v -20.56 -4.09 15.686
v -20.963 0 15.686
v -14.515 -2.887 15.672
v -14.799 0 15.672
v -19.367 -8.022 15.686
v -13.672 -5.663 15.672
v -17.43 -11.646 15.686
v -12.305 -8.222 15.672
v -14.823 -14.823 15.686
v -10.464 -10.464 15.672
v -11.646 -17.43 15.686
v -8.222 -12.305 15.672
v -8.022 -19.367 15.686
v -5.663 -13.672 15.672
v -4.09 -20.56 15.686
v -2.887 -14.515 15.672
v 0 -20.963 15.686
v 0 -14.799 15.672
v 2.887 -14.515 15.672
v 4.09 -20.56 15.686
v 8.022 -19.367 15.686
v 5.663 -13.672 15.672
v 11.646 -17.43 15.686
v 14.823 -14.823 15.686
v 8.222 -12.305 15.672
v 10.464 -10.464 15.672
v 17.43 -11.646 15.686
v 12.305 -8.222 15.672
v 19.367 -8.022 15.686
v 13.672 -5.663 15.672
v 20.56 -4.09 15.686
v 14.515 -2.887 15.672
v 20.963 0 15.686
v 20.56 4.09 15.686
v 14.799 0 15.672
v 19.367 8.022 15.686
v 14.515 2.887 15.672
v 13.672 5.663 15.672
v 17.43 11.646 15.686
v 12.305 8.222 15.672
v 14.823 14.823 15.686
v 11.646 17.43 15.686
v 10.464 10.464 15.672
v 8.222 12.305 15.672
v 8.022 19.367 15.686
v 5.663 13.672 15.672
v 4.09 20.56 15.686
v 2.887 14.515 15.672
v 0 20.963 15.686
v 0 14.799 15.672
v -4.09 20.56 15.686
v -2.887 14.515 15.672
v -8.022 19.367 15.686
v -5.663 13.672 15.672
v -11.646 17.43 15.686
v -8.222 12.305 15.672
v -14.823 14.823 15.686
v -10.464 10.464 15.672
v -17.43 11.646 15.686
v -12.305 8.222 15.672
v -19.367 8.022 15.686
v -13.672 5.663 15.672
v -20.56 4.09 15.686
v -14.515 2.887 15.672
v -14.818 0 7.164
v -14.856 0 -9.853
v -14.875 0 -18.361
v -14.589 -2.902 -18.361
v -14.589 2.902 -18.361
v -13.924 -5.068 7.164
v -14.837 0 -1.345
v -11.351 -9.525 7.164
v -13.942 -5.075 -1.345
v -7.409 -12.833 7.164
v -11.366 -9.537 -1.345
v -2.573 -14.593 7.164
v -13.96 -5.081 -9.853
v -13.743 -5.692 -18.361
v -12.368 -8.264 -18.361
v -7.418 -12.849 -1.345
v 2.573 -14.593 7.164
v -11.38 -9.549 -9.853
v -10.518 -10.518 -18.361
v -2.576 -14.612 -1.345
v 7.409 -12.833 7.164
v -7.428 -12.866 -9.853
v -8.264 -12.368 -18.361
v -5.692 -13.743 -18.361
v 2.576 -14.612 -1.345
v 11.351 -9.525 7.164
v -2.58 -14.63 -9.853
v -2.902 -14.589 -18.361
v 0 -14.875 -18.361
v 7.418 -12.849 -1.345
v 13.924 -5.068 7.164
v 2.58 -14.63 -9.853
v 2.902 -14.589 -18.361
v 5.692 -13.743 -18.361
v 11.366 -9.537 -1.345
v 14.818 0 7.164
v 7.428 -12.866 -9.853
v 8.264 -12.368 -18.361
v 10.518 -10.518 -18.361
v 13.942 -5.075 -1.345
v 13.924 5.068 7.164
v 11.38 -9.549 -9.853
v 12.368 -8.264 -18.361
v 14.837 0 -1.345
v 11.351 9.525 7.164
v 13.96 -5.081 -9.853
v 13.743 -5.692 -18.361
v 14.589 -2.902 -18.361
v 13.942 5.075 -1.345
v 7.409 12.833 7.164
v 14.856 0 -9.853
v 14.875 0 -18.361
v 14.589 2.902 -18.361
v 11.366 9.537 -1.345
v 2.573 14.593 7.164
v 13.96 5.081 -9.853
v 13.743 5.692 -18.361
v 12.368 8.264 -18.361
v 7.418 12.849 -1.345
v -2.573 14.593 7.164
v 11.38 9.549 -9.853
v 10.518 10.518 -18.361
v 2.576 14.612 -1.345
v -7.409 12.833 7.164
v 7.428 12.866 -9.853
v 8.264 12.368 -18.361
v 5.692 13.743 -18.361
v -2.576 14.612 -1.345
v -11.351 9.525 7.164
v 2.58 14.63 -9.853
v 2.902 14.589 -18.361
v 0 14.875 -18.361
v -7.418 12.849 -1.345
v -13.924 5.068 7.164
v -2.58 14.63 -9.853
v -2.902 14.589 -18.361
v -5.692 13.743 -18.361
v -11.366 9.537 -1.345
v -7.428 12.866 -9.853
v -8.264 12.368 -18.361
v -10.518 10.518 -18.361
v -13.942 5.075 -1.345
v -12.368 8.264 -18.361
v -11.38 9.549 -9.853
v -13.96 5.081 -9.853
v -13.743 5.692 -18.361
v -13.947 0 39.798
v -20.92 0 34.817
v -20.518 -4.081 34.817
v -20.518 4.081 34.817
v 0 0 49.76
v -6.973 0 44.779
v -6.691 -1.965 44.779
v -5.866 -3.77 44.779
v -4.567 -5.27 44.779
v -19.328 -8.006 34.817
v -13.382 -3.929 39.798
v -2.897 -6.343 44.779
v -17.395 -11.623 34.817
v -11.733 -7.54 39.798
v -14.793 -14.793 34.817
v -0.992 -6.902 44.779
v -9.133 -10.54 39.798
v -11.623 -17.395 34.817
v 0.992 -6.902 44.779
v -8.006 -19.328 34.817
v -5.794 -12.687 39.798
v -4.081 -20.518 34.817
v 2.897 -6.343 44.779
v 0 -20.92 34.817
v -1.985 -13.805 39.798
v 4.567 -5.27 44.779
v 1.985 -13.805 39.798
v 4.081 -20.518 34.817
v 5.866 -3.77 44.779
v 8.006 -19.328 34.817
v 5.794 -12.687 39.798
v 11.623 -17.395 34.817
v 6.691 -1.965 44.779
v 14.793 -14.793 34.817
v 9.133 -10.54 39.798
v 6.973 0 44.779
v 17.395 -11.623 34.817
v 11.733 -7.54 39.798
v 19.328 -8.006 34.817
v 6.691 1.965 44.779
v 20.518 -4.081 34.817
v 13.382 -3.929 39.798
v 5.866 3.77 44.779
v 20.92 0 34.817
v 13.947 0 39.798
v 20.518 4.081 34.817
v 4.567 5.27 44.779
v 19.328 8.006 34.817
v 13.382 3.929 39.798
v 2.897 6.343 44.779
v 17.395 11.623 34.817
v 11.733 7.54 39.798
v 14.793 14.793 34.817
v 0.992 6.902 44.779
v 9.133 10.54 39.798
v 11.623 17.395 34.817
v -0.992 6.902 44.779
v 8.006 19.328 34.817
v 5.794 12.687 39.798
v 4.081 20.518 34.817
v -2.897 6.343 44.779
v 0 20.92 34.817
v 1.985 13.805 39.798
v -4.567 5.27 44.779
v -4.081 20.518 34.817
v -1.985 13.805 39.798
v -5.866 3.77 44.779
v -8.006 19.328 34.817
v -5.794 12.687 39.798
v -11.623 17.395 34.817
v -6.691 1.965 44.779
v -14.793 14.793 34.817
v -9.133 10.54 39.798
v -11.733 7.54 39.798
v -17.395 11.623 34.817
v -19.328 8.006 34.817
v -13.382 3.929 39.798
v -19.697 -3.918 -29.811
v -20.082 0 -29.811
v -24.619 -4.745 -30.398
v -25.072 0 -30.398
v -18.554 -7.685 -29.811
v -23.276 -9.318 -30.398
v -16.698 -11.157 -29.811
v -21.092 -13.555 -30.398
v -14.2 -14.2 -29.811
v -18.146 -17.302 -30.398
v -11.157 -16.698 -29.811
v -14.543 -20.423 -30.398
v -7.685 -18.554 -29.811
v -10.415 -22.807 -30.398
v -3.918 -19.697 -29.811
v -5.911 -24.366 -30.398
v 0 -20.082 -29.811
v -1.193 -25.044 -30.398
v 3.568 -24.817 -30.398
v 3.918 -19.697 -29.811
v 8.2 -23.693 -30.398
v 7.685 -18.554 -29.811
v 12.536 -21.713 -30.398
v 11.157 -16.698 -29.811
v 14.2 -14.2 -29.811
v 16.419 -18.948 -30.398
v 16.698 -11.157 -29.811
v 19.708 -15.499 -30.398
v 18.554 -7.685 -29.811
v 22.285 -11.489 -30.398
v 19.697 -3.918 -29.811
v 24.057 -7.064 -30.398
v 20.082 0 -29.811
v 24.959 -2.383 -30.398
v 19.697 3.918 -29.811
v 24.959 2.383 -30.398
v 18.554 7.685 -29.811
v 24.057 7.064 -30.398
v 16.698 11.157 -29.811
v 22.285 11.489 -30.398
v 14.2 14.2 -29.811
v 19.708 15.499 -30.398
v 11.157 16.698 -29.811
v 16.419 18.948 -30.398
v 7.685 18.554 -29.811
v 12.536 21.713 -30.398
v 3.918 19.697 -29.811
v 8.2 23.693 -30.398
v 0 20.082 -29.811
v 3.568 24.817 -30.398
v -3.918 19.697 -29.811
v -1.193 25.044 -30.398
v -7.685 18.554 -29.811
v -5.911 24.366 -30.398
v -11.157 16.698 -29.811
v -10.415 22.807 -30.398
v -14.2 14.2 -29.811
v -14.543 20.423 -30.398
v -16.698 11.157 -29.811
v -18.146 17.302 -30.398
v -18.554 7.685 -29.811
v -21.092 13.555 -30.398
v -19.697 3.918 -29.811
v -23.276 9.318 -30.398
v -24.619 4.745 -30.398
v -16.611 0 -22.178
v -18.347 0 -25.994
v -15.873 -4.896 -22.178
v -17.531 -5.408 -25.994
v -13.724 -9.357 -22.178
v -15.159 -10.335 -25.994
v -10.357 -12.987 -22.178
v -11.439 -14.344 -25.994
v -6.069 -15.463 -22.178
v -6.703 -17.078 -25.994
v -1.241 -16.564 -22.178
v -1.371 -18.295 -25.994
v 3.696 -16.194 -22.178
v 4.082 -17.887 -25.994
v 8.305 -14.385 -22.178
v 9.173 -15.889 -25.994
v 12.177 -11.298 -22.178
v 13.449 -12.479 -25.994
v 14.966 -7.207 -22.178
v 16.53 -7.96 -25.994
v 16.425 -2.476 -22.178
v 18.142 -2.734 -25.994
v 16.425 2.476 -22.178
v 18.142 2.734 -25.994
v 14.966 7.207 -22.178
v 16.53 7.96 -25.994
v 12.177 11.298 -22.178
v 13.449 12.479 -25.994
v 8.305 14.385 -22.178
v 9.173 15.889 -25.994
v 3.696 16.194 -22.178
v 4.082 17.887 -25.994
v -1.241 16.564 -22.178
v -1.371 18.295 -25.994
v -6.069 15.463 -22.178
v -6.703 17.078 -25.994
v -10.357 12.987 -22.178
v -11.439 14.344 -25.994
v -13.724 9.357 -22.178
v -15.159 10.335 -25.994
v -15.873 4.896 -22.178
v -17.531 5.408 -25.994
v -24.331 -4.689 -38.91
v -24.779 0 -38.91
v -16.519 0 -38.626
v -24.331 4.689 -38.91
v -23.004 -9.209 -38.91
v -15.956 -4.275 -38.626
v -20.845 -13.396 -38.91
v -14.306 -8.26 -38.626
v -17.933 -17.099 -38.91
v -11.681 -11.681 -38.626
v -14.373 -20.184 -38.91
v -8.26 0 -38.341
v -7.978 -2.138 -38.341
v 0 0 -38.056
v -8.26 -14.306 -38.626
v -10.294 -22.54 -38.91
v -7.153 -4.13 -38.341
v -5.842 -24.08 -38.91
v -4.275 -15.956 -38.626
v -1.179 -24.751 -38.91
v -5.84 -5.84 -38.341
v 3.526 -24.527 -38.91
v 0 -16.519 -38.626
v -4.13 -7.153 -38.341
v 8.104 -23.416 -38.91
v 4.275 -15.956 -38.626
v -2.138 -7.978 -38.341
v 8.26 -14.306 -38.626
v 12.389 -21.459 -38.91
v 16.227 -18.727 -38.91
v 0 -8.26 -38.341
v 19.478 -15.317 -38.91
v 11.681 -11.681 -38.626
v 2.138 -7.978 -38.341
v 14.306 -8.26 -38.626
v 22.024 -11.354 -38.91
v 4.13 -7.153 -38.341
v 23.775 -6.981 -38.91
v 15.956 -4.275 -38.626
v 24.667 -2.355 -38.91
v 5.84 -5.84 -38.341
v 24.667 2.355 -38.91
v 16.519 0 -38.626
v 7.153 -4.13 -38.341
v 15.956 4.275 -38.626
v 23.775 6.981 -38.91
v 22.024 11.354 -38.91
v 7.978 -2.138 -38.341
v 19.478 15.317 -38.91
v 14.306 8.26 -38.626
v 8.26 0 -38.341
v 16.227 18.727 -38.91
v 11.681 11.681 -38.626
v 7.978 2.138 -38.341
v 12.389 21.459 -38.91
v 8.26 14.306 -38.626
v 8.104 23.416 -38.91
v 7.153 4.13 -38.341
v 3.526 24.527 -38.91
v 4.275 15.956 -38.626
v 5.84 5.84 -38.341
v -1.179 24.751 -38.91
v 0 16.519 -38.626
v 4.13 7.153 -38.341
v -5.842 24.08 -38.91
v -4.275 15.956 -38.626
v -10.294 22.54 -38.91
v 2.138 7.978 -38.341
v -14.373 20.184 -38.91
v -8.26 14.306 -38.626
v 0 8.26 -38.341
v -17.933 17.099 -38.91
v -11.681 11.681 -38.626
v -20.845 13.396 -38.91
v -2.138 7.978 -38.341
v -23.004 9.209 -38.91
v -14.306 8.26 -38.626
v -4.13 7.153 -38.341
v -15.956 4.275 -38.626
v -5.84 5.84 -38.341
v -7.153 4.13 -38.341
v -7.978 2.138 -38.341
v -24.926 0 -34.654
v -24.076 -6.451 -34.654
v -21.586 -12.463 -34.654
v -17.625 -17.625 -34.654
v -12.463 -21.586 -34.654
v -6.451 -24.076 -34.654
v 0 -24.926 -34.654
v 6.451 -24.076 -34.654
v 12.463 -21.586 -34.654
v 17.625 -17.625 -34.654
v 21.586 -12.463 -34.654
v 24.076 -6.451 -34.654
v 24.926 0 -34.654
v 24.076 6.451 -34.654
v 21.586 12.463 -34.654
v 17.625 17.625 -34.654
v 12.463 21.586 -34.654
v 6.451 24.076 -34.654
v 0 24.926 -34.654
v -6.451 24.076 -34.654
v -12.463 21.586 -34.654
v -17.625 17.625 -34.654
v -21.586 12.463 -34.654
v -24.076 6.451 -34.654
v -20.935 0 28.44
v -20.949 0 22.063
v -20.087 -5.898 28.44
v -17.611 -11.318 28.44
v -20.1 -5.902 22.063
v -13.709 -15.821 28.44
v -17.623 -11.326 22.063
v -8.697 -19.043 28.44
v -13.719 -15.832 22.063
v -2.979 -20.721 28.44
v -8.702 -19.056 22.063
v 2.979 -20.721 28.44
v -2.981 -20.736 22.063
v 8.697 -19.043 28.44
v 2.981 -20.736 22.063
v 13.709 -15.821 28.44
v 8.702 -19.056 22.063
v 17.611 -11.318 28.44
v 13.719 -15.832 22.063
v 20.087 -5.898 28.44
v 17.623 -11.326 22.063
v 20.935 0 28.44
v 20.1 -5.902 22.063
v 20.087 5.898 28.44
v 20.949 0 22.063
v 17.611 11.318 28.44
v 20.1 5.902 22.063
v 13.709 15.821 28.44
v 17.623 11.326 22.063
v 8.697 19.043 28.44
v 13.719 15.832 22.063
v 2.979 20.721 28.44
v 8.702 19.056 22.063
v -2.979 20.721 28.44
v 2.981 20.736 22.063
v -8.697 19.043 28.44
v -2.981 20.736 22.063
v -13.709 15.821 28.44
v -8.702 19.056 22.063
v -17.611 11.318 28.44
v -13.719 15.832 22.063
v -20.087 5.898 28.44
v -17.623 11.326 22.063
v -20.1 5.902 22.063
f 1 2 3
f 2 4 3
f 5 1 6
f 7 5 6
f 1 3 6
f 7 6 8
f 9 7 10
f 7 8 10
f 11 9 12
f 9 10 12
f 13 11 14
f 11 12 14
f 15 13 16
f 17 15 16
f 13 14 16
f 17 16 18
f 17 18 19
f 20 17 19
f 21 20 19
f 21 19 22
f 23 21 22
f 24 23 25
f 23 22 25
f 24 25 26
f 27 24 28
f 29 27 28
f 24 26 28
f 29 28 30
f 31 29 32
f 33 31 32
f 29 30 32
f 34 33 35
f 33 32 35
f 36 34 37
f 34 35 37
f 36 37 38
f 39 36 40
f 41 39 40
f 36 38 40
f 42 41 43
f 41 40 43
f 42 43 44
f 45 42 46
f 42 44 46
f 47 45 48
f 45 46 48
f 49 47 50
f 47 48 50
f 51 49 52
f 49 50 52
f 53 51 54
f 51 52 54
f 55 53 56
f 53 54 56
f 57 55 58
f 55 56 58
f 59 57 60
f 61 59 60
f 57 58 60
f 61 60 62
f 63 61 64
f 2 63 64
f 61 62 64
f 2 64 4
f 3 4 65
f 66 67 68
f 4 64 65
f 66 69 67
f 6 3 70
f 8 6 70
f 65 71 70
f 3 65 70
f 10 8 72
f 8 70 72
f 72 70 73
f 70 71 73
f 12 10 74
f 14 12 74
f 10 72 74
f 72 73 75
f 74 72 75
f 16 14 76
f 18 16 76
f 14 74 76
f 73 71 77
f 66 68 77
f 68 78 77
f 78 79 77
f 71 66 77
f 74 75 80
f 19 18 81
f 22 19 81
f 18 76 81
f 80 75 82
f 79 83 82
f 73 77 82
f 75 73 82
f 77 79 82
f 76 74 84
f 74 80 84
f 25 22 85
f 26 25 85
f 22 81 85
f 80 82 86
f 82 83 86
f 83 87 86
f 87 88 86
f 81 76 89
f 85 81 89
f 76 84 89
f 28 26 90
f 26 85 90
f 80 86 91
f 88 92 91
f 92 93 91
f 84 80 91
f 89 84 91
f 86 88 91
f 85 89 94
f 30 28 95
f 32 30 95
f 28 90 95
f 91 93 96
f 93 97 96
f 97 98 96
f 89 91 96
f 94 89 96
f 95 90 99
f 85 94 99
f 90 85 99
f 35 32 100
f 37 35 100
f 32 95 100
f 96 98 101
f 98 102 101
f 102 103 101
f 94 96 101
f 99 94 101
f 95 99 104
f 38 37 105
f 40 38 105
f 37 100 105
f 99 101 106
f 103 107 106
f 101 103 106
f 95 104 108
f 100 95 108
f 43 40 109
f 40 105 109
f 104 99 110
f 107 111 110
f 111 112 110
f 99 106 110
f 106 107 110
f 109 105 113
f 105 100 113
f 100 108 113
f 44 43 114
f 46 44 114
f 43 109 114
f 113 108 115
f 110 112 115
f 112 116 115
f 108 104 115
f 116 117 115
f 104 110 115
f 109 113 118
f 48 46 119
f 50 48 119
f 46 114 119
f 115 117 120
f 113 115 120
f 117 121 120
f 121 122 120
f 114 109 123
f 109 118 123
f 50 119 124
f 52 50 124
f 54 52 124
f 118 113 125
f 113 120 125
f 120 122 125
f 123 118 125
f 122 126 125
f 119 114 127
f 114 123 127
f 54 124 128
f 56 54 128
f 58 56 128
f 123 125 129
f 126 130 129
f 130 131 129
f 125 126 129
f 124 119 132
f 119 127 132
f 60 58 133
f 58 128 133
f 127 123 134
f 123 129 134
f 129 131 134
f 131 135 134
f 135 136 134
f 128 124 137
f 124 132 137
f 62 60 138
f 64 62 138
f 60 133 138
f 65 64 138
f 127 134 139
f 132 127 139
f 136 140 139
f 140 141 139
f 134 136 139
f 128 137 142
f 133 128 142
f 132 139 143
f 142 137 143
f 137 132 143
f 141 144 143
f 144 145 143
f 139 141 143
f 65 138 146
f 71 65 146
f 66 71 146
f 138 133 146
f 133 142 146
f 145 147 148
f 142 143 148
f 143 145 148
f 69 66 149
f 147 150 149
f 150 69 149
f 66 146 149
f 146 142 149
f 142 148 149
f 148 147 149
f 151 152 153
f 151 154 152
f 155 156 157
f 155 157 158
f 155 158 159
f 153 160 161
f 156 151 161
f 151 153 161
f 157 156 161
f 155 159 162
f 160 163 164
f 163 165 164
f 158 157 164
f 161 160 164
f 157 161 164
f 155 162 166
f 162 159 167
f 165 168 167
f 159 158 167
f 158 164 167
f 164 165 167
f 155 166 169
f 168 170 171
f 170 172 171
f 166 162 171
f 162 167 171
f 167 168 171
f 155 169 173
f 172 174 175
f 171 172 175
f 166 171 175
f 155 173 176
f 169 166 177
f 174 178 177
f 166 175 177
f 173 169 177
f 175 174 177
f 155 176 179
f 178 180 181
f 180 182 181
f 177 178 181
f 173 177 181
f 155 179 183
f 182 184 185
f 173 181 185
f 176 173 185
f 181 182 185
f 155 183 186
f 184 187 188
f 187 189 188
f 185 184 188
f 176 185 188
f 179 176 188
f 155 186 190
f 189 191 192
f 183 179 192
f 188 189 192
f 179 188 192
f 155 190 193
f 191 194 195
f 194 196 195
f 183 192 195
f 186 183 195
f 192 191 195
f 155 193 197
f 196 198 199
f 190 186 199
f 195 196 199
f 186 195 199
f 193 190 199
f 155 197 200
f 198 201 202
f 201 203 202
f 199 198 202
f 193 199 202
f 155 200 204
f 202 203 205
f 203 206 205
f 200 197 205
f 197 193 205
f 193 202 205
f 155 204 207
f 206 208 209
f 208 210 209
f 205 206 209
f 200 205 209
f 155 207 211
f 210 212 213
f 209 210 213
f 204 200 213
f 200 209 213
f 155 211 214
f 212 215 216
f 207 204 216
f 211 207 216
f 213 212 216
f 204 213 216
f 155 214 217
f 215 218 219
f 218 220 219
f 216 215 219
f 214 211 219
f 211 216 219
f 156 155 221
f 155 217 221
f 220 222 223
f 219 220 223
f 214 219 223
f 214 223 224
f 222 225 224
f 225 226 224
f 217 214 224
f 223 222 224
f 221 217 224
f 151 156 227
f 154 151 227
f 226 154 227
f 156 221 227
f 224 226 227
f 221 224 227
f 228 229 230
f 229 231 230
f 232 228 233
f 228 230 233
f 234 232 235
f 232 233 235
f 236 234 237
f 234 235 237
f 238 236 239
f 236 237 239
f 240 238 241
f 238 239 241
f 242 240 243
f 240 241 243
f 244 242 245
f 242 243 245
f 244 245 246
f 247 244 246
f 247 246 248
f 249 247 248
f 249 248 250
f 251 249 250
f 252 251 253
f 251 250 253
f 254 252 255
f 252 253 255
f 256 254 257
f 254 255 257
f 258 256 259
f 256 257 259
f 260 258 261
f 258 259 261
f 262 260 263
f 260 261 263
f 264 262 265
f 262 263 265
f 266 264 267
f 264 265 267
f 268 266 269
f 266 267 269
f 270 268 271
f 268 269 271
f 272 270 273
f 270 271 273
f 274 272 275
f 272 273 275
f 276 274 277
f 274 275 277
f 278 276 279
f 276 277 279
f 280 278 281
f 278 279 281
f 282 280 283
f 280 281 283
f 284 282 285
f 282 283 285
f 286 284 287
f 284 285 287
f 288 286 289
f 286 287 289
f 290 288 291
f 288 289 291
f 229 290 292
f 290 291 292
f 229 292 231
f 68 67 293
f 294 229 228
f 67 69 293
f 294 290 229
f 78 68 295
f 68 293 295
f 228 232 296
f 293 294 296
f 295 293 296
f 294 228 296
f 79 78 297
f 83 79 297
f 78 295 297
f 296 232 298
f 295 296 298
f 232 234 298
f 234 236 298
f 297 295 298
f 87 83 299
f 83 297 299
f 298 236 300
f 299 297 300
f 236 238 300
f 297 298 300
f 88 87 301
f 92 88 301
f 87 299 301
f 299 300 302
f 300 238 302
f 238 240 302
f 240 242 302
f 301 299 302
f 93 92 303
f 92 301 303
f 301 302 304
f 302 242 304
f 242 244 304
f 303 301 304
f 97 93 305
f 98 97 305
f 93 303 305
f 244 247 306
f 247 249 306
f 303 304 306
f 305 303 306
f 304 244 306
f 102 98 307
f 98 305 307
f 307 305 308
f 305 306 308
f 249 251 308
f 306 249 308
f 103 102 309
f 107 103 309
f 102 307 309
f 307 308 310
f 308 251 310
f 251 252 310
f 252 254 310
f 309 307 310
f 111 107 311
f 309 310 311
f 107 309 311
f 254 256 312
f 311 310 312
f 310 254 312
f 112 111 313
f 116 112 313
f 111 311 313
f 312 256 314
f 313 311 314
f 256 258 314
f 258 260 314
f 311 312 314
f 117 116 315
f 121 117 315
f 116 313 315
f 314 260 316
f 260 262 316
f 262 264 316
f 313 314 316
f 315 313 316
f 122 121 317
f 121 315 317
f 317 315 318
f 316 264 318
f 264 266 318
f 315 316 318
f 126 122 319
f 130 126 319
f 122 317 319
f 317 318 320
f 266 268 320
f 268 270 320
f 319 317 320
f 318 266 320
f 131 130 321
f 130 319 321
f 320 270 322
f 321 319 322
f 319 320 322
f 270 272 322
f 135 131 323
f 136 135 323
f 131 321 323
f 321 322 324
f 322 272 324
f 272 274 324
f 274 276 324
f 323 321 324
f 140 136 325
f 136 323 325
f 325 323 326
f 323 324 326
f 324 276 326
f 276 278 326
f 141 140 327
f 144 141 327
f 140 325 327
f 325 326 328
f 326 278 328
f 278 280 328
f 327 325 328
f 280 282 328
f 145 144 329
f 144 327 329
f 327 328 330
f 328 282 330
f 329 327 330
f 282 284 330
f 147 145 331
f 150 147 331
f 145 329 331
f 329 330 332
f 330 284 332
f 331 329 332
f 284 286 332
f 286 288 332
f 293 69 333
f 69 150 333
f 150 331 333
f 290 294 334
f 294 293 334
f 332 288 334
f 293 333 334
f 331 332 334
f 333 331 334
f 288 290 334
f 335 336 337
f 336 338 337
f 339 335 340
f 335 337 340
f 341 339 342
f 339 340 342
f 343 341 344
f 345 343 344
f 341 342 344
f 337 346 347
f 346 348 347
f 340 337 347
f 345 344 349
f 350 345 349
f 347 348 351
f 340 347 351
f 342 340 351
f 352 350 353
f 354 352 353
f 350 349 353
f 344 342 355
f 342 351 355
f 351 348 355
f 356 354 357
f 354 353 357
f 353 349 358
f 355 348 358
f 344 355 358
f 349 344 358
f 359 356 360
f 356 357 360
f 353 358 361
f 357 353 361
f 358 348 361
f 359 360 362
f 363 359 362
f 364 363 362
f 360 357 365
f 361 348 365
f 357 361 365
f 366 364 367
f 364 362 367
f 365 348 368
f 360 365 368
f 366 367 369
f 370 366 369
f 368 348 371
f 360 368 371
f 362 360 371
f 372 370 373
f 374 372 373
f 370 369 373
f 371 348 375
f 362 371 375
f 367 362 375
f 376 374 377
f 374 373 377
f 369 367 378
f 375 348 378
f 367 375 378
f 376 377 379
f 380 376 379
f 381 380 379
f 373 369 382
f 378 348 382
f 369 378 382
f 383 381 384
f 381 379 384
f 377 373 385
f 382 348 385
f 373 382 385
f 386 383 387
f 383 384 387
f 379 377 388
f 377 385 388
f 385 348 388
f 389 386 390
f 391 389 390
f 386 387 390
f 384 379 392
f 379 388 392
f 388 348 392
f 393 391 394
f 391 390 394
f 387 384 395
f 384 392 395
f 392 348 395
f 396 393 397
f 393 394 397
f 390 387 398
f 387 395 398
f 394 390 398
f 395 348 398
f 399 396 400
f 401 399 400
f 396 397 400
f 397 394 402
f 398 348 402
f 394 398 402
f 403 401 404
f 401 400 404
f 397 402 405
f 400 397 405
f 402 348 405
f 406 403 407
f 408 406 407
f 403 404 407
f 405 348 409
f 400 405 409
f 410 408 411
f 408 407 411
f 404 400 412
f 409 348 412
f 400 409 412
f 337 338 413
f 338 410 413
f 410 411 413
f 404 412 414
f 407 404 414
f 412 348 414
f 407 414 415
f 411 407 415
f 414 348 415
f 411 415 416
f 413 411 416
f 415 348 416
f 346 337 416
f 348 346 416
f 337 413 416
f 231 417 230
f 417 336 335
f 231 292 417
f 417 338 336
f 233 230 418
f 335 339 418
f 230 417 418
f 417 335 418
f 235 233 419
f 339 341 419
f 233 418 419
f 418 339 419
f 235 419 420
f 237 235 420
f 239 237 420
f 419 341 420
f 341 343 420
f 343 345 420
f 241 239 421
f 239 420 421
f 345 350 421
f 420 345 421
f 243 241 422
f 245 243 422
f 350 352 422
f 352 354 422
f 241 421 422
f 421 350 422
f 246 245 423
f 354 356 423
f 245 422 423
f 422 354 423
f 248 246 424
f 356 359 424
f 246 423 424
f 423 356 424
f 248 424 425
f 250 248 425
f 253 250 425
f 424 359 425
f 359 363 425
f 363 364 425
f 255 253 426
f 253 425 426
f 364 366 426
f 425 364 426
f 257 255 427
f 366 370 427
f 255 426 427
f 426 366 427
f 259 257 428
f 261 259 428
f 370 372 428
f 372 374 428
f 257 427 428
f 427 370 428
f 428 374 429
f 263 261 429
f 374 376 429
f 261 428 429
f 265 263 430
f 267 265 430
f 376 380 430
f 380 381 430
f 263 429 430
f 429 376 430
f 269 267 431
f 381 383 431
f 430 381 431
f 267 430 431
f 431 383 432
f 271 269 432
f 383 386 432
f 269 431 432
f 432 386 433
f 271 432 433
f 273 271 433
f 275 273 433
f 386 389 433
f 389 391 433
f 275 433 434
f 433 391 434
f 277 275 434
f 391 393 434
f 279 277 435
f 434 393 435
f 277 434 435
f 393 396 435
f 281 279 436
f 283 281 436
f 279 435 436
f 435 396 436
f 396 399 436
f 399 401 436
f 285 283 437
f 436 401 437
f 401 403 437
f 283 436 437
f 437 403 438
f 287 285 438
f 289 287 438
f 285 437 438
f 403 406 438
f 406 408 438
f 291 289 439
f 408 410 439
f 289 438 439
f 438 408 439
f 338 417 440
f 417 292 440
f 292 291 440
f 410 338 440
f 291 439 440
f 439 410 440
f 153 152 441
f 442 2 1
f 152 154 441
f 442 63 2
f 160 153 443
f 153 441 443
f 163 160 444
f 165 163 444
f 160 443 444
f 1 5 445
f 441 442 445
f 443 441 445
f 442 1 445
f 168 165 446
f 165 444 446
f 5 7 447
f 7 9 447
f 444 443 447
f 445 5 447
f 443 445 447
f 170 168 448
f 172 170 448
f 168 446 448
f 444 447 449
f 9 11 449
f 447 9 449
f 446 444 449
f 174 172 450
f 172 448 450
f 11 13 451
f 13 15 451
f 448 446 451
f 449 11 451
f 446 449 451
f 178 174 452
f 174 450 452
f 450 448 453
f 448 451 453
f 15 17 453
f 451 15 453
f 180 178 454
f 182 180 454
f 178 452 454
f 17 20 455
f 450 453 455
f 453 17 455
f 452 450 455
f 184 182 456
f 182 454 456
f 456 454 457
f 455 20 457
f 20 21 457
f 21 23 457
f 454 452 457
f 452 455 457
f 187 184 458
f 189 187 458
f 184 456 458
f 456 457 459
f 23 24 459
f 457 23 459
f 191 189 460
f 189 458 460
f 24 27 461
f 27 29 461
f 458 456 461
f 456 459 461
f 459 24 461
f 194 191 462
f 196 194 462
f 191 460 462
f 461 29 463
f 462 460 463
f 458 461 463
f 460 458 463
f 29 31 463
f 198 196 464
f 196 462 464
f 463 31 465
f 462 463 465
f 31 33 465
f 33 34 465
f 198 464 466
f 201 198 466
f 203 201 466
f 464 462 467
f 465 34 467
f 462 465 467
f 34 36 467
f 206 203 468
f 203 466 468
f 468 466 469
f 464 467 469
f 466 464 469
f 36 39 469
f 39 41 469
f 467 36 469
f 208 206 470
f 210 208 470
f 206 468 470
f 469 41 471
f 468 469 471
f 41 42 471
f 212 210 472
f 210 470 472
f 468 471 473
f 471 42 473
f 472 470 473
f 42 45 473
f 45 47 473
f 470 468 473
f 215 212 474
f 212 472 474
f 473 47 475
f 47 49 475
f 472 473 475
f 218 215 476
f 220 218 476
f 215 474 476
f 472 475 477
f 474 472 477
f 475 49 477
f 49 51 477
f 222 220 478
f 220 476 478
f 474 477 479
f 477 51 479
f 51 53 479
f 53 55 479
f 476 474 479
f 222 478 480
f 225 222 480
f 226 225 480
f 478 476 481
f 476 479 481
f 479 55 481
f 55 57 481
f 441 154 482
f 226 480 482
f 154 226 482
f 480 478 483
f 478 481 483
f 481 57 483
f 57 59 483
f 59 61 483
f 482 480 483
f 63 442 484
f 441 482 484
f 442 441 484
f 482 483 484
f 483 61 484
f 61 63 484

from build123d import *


with BuildPart() as f1:
    # F0 (on Front) → F1 (revolve)
    with BuildSketch(Plane.XZ):
        Polygon((0, 34.8173603415), (0, 49.7604347765), (-20.9203045815, 34.8173603415), align=None)
        Polygon((0, 34.8173603415), (-20.9203045815, 34.8173603415), (-20.9630057216, 15.6858414412), (-14.7989457213, 15.6720833914), (0, 15.6390524618), align=None)
        Polygon((0, -38.0559399025), (0, 15.6390524618), (-14.7989457213, 15.6720833914), (-14.8749074655, -18.3612829992), (-20.0824216008, -29.8110116273), (-25.0723995268, -30.3980689496), (-24.7788708657, -38.9103852212), align=None)
    revolve(axis=Axis((0, 0, -11.2084437204), (0, 0, 1)))


solid = f1.part
